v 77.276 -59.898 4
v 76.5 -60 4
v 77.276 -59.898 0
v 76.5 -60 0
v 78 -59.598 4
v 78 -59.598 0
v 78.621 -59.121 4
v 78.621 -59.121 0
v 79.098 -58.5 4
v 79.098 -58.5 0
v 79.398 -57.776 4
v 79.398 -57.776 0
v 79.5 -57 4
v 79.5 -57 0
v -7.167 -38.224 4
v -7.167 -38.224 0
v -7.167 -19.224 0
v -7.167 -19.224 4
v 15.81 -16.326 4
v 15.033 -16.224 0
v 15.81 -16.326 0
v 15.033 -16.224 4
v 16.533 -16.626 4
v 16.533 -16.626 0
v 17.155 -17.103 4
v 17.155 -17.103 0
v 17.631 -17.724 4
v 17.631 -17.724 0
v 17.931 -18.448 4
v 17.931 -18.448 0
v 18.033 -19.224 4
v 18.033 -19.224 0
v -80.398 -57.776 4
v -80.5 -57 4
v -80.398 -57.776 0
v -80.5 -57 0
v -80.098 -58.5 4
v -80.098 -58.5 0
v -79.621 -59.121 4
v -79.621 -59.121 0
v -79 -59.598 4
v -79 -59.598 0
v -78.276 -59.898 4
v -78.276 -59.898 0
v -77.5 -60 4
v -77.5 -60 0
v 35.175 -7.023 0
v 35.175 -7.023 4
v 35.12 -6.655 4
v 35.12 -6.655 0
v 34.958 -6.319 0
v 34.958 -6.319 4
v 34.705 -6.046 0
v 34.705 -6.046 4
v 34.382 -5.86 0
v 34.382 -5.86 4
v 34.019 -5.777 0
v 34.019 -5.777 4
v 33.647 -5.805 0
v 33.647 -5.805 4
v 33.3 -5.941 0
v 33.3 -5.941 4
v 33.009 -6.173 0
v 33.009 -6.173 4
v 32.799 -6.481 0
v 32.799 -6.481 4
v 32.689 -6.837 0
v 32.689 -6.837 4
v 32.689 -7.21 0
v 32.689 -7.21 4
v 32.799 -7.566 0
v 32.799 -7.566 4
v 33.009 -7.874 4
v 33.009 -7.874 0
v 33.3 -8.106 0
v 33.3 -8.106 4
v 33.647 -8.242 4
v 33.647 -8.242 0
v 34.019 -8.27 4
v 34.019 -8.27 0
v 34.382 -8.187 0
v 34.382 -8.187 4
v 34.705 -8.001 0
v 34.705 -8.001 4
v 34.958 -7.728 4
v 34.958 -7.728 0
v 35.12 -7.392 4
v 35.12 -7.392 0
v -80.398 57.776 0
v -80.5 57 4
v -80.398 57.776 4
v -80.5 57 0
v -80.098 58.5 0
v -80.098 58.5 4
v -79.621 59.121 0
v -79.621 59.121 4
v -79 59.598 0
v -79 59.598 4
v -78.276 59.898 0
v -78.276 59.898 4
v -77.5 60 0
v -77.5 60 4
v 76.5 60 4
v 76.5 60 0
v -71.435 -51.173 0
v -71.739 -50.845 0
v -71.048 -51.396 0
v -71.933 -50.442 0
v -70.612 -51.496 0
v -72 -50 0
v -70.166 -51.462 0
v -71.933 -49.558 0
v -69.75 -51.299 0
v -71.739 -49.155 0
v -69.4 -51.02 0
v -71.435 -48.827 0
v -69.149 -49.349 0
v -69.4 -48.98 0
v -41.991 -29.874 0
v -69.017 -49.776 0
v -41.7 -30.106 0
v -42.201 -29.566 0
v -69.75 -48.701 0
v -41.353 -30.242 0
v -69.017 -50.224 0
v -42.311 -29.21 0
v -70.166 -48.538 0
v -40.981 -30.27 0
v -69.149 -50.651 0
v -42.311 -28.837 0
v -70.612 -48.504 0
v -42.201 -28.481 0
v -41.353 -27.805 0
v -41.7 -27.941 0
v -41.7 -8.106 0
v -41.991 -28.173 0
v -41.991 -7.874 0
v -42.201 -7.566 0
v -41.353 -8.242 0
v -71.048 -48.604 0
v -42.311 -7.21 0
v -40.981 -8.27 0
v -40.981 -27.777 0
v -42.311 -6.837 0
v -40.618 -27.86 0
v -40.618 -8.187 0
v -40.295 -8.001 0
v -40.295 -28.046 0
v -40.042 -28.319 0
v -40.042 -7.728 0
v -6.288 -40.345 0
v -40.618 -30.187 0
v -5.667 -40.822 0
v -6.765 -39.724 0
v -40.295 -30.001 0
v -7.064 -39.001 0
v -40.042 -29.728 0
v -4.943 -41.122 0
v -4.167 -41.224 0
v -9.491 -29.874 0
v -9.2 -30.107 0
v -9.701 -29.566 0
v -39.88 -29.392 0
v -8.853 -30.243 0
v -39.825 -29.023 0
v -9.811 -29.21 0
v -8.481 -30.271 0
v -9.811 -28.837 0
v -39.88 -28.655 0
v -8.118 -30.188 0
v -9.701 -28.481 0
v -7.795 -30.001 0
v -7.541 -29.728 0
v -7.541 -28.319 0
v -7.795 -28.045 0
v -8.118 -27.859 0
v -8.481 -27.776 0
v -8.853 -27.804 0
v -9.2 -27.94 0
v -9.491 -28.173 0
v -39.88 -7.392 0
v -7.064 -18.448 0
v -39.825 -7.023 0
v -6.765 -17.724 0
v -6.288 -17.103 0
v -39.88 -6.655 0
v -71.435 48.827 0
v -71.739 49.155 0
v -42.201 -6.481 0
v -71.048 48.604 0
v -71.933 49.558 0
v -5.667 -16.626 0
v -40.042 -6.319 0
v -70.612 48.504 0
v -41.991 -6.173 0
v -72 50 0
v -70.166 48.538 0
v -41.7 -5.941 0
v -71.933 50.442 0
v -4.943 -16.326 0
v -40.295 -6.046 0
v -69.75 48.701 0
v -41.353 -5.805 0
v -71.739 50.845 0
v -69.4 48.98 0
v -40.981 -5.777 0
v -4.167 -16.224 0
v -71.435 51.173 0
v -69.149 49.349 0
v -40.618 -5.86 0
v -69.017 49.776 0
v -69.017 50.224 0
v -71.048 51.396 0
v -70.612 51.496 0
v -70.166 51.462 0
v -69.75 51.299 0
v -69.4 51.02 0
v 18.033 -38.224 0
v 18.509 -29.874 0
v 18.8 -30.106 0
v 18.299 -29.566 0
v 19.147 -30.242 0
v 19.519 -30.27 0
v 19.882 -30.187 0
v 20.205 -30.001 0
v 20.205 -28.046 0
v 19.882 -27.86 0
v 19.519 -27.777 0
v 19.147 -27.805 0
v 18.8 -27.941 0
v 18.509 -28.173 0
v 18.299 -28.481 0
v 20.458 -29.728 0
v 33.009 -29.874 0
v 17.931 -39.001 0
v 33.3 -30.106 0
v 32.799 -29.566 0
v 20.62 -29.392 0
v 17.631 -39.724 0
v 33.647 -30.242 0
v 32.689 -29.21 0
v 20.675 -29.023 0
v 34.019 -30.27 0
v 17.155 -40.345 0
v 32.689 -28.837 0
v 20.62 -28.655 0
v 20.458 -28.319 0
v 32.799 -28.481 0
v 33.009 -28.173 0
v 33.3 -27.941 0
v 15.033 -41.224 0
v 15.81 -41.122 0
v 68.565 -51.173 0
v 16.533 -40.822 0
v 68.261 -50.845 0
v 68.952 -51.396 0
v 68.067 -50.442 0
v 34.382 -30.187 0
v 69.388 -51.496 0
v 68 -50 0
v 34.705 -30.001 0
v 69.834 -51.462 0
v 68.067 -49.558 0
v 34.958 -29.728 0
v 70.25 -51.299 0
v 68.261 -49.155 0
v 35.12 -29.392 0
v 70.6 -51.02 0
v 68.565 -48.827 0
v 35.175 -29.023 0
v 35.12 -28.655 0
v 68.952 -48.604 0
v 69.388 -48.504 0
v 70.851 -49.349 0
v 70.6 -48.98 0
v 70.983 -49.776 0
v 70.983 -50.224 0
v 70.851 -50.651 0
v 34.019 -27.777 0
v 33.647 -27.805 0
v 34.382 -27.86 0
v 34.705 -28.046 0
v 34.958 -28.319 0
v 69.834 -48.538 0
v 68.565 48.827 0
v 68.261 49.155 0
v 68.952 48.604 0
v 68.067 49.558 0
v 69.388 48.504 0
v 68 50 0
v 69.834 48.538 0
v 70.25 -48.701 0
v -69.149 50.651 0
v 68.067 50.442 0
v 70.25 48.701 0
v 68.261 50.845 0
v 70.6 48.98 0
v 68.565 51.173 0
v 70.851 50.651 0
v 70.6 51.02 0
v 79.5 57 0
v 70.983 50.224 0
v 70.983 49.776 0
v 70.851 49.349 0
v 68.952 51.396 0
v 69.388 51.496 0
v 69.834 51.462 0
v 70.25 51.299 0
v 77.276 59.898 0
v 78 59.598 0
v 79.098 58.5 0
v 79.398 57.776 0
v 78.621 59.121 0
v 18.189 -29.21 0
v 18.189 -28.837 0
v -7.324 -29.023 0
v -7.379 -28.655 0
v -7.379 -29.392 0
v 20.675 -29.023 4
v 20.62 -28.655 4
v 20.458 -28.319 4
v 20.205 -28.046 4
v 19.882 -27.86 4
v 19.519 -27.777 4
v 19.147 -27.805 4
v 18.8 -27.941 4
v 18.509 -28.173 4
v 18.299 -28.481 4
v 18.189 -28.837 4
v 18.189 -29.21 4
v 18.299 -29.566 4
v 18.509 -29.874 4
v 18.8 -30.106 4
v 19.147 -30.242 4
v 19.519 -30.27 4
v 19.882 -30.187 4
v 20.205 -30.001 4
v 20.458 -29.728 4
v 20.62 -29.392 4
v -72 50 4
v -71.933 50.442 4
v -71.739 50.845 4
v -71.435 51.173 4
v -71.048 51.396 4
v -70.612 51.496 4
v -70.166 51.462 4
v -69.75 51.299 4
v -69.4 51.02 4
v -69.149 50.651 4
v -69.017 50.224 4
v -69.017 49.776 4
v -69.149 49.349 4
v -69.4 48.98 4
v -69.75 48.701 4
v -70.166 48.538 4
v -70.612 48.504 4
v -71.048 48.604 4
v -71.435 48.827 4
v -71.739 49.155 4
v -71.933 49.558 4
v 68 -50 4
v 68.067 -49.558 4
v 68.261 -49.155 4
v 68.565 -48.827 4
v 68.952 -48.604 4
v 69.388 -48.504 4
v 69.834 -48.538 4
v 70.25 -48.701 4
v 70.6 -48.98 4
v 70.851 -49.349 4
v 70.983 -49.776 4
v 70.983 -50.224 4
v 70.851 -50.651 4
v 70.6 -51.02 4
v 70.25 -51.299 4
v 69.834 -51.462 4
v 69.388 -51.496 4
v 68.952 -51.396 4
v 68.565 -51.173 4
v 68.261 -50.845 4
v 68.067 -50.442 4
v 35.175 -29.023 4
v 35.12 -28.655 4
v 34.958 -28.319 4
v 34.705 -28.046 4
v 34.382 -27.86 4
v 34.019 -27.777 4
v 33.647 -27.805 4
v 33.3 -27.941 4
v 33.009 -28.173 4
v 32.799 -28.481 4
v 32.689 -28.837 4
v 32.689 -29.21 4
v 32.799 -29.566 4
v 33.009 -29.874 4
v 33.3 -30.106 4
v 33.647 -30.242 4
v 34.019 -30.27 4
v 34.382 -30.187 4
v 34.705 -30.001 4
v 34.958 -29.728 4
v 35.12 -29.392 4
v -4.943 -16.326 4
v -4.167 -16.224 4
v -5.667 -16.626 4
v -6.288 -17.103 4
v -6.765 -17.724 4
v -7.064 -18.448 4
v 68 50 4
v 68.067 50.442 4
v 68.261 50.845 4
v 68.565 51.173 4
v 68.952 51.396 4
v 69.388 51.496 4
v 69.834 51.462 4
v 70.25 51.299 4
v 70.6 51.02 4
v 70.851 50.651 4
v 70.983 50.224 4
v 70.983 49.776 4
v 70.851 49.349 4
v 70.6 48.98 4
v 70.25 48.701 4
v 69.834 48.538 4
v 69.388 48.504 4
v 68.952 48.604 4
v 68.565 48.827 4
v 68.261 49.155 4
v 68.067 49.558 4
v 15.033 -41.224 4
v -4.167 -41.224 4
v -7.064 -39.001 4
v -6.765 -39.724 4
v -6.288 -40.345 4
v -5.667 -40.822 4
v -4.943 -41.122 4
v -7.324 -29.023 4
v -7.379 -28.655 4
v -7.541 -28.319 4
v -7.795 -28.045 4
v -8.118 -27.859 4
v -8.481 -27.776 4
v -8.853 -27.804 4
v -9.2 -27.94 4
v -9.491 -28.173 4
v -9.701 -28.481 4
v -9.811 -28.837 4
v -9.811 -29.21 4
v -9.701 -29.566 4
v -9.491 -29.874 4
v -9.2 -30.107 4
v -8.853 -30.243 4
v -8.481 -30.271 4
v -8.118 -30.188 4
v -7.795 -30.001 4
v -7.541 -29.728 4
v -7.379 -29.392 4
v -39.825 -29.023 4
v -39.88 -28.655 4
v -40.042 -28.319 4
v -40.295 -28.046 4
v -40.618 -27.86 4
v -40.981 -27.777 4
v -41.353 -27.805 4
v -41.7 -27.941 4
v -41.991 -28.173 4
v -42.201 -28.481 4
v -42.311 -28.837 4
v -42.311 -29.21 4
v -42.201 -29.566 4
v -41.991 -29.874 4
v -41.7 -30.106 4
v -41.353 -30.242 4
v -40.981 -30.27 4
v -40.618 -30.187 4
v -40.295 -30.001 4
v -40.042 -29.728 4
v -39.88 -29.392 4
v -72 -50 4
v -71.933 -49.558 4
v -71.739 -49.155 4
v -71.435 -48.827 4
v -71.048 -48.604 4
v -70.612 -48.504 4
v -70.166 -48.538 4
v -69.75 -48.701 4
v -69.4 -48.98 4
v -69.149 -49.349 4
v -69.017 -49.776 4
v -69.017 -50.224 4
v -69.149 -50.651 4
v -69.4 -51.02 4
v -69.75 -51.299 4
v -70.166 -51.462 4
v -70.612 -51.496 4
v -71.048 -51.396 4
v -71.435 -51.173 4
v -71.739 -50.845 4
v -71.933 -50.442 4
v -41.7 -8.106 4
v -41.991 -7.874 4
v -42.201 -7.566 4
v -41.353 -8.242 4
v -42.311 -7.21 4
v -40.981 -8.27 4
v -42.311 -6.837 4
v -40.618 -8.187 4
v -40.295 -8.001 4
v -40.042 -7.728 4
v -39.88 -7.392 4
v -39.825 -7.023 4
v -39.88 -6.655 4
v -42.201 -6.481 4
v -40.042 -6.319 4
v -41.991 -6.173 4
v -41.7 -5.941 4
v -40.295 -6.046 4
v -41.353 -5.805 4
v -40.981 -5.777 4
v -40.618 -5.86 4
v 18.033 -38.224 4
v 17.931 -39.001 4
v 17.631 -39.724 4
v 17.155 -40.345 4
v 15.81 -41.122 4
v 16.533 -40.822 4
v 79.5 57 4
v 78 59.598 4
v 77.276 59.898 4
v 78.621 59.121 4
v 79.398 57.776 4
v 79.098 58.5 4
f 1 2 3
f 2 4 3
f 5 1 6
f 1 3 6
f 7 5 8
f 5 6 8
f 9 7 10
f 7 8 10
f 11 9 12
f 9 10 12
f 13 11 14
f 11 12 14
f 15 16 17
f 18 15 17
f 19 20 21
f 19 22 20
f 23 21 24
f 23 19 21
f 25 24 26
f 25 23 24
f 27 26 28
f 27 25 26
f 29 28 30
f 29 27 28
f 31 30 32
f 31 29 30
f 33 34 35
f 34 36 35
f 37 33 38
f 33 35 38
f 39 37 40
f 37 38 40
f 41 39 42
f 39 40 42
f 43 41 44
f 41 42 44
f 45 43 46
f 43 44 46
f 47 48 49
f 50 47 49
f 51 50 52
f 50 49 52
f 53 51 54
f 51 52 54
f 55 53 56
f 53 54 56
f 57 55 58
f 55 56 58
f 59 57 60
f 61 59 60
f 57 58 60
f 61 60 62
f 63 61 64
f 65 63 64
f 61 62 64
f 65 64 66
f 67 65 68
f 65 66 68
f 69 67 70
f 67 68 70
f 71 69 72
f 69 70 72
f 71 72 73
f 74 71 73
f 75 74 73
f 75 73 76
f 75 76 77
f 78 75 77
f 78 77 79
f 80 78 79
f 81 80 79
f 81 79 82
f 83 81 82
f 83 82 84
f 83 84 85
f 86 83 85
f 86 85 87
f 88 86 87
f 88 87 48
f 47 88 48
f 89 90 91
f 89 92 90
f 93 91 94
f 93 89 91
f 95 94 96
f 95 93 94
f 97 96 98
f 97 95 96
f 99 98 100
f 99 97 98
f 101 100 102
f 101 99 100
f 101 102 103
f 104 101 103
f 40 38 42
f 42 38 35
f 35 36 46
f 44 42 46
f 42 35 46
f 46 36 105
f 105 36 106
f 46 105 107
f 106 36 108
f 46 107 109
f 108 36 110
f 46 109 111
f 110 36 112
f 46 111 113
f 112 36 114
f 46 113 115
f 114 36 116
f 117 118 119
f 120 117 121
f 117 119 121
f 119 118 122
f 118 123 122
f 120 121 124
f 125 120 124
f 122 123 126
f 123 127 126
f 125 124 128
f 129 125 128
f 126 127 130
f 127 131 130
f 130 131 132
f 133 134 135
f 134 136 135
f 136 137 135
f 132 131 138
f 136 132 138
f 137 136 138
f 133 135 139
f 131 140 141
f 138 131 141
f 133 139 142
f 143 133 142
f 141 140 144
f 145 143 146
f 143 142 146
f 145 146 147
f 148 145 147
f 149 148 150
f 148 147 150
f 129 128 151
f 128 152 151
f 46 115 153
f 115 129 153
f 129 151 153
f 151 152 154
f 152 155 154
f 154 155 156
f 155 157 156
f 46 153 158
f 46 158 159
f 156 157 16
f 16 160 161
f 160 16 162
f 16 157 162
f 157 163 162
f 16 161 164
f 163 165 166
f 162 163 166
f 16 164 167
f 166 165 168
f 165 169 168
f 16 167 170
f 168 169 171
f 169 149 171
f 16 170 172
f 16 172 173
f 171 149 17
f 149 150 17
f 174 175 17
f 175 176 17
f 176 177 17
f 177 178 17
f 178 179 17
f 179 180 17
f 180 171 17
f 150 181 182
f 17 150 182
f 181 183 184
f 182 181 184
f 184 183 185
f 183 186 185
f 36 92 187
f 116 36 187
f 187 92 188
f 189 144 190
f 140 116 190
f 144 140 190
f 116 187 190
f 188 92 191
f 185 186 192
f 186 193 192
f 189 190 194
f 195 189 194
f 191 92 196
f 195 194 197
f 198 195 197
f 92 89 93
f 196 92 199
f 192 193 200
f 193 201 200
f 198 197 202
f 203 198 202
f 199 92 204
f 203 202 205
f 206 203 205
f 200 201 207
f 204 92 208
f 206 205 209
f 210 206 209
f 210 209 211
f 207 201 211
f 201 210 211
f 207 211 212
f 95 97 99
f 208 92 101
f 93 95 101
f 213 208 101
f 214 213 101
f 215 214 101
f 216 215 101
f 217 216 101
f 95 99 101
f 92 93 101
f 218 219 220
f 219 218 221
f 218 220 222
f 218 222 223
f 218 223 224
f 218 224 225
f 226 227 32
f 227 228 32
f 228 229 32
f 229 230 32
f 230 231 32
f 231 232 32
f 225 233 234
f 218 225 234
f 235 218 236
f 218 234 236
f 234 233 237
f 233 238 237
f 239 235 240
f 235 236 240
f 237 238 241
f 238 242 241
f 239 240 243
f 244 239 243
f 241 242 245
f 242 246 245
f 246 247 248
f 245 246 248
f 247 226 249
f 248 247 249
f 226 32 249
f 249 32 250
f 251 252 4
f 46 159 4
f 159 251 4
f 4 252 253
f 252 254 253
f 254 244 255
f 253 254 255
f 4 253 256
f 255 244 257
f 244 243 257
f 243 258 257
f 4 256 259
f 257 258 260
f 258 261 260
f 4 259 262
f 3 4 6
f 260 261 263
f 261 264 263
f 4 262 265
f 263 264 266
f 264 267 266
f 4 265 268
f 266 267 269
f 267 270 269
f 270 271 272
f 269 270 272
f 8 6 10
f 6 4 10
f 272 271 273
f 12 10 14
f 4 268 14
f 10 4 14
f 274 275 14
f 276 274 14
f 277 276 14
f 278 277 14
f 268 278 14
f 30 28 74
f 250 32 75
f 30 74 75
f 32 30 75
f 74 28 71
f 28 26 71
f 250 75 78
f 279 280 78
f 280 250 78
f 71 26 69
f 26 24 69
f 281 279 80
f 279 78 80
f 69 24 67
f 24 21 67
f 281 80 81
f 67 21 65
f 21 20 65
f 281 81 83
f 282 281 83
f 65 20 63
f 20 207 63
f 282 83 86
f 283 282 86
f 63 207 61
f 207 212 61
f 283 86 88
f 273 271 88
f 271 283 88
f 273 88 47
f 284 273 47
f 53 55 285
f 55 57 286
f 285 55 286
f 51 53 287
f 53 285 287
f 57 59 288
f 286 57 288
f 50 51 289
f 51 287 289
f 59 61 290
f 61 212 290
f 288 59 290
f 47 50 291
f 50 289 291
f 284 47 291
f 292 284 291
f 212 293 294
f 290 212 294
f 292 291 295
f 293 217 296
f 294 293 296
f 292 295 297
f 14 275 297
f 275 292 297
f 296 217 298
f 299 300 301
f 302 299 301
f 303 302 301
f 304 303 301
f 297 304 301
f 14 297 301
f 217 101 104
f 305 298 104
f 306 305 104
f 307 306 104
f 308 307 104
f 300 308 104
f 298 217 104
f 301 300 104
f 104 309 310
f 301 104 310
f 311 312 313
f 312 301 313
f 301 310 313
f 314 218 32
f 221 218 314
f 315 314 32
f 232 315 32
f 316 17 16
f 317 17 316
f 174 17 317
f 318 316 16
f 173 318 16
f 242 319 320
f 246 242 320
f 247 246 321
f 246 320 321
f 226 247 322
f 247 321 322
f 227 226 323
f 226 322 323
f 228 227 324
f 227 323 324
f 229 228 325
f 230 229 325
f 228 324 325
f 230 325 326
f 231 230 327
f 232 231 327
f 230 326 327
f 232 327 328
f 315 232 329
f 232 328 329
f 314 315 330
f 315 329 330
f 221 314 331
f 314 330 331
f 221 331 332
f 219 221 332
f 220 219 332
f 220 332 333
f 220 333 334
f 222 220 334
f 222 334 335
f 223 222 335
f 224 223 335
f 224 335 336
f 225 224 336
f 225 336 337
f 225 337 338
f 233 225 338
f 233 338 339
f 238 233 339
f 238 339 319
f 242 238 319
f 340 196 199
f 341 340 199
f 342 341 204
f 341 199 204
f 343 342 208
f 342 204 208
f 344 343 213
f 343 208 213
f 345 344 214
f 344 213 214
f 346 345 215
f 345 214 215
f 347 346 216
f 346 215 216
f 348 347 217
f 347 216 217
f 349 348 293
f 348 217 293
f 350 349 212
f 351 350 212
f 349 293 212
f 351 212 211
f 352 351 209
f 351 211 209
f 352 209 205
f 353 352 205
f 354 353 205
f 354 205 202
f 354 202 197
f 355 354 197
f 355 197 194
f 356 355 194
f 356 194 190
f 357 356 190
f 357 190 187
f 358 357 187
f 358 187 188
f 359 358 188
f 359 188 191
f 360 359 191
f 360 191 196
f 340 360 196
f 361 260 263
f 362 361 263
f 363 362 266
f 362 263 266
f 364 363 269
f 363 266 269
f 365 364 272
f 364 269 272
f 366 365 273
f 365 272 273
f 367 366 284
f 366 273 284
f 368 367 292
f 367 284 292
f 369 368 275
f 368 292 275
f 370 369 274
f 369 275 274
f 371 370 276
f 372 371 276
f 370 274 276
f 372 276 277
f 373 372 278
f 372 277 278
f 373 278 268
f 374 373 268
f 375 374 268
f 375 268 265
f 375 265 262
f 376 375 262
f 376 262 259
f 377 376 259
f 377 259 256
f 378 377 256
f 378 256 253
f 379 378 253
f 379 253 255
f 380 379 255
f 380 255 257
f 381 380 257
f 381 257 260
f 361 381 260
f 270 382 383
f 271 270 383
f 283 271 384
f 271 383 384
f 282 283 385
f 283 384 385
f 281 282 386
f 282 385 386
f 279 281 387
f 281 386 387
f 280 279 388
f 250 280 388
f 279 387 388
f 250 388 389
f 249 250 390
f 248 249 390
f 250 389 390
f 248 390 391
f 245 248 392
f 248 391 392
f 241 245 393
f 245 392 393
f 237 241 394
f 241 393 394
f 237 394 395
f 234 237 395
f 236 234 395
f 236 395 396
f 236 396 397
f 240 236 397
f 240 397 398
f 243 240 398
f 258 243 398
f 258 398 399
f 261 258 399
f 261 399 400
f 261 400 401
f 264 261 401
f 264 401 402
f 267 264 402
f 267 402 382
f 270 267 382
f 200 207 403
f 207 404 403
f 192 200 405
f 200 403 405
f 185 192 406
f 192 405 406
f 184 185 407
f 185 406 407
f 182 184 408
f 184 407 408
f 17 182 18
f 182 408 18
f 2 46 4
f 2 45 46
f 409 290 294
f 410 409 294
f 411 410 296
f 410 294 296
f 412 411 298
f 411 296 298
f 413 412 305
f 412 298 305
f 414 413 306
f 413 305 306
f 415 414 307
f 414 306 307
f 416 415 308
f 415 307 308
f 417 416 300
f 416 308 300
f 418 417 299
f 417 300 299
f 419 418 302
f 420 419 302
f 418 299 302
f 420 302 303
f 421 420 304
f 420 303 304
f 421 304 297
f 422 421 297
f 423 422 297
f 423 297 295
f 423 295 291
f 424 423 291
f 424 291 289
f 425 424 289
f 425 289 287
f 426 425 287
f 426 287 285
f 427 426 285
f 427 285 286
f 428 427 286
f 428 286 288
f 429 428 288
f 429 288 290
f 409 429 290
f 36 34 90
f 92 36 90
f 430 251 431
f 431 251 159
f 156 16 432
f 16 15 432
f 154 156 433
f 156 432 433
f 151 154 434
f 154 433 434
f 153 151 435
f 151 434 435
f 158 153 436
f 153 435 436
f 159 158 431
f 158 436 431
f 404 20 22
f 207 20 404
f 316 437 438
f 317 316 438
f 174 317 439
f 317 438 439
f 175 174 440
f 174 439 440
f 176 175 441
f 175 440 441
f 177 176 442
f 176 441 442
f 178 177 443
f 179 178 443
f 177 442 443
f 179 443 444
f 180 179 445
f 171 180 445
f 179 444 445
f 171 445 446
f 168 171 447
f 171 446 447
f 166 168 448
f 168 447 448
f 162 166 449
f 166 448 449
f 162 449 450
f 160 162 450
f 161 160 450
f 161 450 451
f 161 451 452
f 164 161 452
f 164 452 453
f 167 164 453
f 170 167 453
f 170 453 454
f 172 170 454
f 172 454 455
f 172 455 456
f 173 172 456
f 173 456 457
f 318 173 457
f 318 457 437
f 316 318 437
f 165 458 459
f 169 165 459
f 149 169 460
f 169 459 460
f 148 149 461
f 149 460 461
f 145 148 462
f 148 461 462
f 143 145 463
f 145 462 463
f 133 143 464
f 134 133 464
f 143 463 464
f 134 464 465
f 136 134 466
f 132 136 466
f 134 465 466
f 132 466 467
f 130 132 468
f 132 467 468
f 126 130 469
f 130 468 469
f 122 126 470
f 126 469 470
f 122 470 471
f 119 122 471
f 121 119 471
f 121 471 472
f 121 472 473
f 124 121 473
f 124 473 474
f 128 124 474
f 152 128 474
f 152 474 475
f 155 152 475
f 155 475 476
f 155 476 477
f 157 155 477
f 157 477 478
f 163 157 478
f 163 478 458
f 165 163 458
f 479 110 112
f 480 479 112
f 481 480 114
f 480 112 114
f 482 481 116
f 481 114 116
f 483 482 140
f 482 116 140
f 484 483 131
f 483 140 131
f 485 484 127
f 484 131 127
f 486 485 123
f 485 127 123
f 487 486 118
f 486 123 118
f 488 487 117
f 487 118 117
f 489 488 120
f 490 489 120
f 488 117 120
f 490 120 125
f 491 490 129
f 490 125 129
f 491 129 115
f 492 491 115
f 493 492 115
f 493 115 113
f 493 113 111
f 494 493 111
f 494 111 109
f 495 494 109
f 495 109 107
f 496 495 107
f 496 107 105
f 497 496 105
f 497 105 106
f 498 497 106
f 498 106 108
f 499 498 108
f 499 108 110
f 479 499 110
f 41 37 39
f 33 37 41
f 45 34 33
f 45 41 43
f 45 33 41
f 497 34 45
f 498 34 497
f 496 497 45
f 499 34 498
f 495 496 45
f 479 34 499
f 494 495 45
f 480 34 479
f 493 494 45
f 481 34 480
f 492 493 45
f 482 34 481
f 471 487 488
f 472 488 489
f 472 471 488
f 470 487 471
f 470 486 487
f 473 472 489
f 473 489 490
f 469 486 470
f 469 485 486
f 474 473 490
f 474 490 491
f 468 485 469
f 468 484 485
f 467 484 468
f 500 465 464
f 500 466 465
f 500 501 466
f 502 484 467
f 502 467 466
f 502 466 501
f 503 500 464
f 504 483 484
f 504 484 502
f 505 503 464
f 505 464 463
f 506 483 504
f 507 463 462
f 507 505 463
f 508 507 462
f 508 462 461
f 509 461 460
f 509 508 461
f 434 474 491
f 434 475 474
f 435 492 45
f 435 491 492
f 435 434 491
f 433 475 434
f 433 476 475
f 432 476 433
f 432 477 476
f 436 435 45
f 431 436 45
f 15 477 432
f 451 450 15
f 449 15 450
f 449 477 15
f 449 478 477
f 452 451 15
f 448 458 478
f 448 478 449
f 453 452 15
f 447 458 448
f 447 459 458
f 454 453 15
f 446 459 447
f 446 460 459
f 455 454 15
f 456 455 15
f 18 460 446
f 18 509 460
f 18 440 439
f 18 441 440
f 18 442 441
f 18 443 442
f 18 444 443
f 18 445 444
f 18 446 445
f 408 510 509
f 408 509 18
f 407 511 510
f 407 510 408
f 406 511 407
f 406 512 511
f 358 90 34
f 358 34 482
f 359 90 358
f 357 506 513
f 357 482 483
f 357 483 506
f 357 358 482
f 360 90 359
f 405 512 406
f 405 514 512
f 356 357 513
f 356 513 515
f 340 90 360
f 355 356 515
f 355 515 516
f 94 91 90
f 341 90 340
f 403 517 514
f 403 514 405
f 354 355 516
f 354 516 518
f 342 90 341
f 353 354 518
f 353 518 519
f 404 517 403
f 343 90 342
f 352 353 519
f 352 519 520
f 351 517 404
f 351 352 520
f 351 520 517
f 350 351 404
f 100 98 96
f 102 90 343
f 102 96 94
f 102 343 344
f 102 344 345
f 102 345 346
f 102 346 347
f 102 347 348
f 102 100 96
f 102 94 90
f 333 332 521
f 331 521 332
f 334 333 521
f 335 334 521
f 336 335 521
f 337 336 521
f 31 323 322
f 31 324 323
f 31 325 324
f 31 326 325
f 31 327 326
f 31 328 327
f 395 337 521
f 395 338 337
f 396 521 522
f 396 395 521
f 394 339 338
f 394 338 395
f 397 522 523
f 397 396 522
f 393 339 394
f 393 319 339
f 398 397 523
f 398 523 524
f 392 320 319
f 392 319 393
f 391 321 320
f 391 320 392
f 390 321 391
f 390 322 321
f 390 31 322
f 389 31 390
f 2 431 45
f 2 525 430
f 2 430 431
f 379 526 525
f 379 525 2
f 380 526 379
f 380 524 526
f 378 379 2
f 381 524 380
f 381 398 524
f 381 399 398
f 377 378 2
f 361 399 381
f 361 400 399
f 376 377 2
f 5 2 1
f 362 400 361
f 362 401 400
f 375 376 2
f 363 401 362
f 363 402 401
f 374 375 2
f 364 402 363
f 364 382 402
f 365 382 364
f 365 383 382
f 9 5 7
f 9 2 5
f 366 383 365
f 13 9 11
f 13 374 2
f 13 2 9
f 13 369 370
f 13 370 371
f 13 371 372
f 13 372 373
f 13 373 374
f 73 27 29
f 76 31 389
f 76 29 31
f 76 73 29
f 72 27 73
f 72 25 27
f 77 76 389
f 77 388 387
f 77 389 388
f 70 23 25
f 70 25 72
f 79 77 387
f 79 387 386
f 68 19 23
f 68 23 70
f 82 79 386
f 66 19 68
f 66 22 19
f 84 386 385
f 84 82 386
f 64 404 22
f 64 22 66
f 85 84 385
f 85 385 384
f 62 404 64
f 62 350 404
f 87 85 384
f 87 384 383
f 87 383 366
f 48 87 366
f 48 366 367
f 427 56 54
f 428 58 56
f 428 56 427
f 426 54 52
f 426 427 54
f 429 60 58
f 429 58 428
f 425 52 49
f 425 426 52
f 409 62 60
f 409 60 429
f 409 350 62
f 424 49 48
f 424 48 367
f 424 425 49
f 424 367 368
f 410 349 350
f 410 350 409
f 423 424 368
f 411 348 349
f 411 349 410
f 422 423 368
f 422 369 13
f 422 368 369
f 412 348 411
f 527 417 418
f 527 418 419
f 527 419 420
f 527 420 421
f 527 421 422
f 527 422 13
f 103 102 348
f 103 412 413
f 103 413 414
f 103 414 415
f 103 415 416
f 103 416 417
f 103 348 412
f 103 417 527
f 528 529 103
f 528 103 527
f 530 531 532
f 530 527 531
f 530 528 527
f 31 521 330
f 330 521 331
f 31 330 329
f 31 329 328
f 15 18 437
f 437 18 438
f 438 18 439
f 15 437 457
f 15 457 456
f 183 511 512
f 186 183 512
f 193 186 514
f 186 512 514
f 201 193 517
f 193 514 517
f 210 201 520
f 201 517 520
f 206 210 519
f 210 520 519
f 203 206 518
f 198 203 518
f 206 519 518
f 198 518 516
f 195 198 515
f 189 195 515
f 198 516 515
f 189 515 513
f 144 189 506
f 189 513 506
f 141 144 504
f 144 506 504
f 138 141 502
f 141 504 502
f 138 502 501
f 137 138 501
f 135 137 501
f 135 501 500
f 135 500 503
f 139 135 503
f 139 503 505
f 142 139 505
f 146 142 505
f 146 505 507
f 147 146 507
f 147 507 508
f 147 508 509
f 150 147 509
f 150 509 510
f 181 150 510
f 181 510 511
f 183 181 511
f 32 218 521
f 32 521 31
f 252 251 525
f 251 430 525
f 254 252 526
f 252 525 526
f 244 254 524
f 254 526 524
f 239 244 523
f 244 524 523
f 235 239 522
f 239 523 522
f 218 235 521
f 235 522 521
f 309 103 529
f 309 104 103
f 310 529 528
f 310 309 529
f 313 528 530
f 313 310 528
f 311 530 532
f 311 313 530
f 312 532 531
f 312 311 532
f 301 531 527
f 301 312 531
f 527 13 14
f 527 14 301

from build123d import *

# Parameters (mm, degrees)
SKETCH_1_W          = 95
SKETCH_1_H          = 120
EXTRUDE_1_DEPTH     = 4
FILLET_1_R          = 3
SKETCH_4_W          = 160
SKETCH_4_H          = 120
SKETCH_4_W_2        = 89
SKETCH_4_H_2        = 114
EXTRUDE_2_DEPTH     = 4
SKETCH_6_R          = 1.25
SKETCH_6_R_2        = 1.250834389
CUT_EXTRUDE_3_DEPTH = 101.480097532
SKETCH_7_W          = 25.2
SKETCH_7_H          = 25
CUT_EXTRUDE_4_DEPTH = 101.480097532
FILLET_3_R          = 3
SKETCH_8_R          = 1.5
CUT_EXTRUDE_5_DEPTH = 101.480097532


with BuildPart() as part:
    # 草图1 → 凸台-拉伸1 (new body)
    with BuildSketch(Plane.XY):
        Rectangle(SKETCH_1_W, SKETCH_1_H)
    extrude(amount=EXTRUDE_1_DEPTH)

    # 圆角1
    fillet_1_edges = [part.edges().sort_by_distance(p)[0] for p in [
        (-47.5, -60, 2),
        (-47.5, 60, 2),
        (47.5, 60, 2),
        (47.5, -60, 2),
    ]]
    fillet(fillet_1_edges, radius=FILLET_1_R)

    # 草图4 → 凸台-拉伸2 (add)
    with BuildSketch(Plane.XY.offset(4)):
        with Locations((-0.5, 0)):
            Rectangle(SKETCH_4_W, SKETCH_4_H)
        Rectangle(SKETCH_4_W_2, SKETCH_4_H_2, mode=Mode.SUBTRACT)
    extrude(amount=-EXTRUDE_2_DEPTH)

    # 草图6 → 切除-拉伸3 (cut, through all)
    with BuildSketch(Plane.XY.offset(4)):
        with Locations((19.425466369, -29.023426318)):
            Circle(SKETCH_6_R)
        with Locations((-8.574533631, -29.023426318)):
            Circle(SKETCH_6_R_2)
        with Locations((-41.074530224, -7.023426499)):
            Circle(SKETCH_6_R)
        with Locations((-41.074530224, -29.023426318)):
            Circle(SKETCH_6_R)
        with Locations((33.925469772, -29.023426318)):
            Circle(SKETCH_6_R)
        with Locations((33.925469772, -7.023426499)):
            Circle(SKETCH_6_R)
    extrude(amount=-CUT_EXTRUDE_3_DEPTH, mode=Mode.SUBTRACT)

    # 草图7 → 切除-拉伸4 (cut, through all)
    with BuildSketch(Plane(origin=(0, 0, 0), x_dir=(-1, 0, 0), z_dir=(0, 0, -1))):
        with Locations((-5.433347592, -28.724095143)):
            Rectangle(SKETCH_7_W, SKETCH_7_H)
    extrude(amount=-CUT_EXTRUDE_4_DEPTH, mode=Mode.SUBTRACT)

    # 圆角3
    fillet_3_edges = [part.edges().sort_by_distance(p)[0] for p in [
        (-7.166652408, -16.224095143, 2),
        (-7.166652408, -41.224095143, 2),
        (18.033347592, -41.224095143, 2),
        (18.033347592, -16.224095143, 2),
        (79.5, -60, 2),
        (-80.5, 60, 2),
        (-80.5, -60, 2),
        (79.5, 60, 2),
    ]]
    fillet(fillet_3_edges, radius=FILLET_3_R)

    # 草图8 → 切除-拉伸5 (cut, through all)
    with BuildSketch(Plane(origin=(0, 0, 0), x_dir=(-1, 0, 0), z_dir=(0, 0, -1))):
        with Locations((70.5, -50)):
            Circle(SKETCH_8_R)
        with Locations((70.5, 50)):
            Circle(SKETCH_8_R)
        with Locations((-69.5, 50)):
            Circle(SKETCH_8_R)
        with Locations((-69.5, -50)):
            Circle(SKETCH_8_R)
    extrude(amount=-CUT_EXTRUDE_5_DEPTH, mode=Mode.SUBTRACT)


solid = part.part
